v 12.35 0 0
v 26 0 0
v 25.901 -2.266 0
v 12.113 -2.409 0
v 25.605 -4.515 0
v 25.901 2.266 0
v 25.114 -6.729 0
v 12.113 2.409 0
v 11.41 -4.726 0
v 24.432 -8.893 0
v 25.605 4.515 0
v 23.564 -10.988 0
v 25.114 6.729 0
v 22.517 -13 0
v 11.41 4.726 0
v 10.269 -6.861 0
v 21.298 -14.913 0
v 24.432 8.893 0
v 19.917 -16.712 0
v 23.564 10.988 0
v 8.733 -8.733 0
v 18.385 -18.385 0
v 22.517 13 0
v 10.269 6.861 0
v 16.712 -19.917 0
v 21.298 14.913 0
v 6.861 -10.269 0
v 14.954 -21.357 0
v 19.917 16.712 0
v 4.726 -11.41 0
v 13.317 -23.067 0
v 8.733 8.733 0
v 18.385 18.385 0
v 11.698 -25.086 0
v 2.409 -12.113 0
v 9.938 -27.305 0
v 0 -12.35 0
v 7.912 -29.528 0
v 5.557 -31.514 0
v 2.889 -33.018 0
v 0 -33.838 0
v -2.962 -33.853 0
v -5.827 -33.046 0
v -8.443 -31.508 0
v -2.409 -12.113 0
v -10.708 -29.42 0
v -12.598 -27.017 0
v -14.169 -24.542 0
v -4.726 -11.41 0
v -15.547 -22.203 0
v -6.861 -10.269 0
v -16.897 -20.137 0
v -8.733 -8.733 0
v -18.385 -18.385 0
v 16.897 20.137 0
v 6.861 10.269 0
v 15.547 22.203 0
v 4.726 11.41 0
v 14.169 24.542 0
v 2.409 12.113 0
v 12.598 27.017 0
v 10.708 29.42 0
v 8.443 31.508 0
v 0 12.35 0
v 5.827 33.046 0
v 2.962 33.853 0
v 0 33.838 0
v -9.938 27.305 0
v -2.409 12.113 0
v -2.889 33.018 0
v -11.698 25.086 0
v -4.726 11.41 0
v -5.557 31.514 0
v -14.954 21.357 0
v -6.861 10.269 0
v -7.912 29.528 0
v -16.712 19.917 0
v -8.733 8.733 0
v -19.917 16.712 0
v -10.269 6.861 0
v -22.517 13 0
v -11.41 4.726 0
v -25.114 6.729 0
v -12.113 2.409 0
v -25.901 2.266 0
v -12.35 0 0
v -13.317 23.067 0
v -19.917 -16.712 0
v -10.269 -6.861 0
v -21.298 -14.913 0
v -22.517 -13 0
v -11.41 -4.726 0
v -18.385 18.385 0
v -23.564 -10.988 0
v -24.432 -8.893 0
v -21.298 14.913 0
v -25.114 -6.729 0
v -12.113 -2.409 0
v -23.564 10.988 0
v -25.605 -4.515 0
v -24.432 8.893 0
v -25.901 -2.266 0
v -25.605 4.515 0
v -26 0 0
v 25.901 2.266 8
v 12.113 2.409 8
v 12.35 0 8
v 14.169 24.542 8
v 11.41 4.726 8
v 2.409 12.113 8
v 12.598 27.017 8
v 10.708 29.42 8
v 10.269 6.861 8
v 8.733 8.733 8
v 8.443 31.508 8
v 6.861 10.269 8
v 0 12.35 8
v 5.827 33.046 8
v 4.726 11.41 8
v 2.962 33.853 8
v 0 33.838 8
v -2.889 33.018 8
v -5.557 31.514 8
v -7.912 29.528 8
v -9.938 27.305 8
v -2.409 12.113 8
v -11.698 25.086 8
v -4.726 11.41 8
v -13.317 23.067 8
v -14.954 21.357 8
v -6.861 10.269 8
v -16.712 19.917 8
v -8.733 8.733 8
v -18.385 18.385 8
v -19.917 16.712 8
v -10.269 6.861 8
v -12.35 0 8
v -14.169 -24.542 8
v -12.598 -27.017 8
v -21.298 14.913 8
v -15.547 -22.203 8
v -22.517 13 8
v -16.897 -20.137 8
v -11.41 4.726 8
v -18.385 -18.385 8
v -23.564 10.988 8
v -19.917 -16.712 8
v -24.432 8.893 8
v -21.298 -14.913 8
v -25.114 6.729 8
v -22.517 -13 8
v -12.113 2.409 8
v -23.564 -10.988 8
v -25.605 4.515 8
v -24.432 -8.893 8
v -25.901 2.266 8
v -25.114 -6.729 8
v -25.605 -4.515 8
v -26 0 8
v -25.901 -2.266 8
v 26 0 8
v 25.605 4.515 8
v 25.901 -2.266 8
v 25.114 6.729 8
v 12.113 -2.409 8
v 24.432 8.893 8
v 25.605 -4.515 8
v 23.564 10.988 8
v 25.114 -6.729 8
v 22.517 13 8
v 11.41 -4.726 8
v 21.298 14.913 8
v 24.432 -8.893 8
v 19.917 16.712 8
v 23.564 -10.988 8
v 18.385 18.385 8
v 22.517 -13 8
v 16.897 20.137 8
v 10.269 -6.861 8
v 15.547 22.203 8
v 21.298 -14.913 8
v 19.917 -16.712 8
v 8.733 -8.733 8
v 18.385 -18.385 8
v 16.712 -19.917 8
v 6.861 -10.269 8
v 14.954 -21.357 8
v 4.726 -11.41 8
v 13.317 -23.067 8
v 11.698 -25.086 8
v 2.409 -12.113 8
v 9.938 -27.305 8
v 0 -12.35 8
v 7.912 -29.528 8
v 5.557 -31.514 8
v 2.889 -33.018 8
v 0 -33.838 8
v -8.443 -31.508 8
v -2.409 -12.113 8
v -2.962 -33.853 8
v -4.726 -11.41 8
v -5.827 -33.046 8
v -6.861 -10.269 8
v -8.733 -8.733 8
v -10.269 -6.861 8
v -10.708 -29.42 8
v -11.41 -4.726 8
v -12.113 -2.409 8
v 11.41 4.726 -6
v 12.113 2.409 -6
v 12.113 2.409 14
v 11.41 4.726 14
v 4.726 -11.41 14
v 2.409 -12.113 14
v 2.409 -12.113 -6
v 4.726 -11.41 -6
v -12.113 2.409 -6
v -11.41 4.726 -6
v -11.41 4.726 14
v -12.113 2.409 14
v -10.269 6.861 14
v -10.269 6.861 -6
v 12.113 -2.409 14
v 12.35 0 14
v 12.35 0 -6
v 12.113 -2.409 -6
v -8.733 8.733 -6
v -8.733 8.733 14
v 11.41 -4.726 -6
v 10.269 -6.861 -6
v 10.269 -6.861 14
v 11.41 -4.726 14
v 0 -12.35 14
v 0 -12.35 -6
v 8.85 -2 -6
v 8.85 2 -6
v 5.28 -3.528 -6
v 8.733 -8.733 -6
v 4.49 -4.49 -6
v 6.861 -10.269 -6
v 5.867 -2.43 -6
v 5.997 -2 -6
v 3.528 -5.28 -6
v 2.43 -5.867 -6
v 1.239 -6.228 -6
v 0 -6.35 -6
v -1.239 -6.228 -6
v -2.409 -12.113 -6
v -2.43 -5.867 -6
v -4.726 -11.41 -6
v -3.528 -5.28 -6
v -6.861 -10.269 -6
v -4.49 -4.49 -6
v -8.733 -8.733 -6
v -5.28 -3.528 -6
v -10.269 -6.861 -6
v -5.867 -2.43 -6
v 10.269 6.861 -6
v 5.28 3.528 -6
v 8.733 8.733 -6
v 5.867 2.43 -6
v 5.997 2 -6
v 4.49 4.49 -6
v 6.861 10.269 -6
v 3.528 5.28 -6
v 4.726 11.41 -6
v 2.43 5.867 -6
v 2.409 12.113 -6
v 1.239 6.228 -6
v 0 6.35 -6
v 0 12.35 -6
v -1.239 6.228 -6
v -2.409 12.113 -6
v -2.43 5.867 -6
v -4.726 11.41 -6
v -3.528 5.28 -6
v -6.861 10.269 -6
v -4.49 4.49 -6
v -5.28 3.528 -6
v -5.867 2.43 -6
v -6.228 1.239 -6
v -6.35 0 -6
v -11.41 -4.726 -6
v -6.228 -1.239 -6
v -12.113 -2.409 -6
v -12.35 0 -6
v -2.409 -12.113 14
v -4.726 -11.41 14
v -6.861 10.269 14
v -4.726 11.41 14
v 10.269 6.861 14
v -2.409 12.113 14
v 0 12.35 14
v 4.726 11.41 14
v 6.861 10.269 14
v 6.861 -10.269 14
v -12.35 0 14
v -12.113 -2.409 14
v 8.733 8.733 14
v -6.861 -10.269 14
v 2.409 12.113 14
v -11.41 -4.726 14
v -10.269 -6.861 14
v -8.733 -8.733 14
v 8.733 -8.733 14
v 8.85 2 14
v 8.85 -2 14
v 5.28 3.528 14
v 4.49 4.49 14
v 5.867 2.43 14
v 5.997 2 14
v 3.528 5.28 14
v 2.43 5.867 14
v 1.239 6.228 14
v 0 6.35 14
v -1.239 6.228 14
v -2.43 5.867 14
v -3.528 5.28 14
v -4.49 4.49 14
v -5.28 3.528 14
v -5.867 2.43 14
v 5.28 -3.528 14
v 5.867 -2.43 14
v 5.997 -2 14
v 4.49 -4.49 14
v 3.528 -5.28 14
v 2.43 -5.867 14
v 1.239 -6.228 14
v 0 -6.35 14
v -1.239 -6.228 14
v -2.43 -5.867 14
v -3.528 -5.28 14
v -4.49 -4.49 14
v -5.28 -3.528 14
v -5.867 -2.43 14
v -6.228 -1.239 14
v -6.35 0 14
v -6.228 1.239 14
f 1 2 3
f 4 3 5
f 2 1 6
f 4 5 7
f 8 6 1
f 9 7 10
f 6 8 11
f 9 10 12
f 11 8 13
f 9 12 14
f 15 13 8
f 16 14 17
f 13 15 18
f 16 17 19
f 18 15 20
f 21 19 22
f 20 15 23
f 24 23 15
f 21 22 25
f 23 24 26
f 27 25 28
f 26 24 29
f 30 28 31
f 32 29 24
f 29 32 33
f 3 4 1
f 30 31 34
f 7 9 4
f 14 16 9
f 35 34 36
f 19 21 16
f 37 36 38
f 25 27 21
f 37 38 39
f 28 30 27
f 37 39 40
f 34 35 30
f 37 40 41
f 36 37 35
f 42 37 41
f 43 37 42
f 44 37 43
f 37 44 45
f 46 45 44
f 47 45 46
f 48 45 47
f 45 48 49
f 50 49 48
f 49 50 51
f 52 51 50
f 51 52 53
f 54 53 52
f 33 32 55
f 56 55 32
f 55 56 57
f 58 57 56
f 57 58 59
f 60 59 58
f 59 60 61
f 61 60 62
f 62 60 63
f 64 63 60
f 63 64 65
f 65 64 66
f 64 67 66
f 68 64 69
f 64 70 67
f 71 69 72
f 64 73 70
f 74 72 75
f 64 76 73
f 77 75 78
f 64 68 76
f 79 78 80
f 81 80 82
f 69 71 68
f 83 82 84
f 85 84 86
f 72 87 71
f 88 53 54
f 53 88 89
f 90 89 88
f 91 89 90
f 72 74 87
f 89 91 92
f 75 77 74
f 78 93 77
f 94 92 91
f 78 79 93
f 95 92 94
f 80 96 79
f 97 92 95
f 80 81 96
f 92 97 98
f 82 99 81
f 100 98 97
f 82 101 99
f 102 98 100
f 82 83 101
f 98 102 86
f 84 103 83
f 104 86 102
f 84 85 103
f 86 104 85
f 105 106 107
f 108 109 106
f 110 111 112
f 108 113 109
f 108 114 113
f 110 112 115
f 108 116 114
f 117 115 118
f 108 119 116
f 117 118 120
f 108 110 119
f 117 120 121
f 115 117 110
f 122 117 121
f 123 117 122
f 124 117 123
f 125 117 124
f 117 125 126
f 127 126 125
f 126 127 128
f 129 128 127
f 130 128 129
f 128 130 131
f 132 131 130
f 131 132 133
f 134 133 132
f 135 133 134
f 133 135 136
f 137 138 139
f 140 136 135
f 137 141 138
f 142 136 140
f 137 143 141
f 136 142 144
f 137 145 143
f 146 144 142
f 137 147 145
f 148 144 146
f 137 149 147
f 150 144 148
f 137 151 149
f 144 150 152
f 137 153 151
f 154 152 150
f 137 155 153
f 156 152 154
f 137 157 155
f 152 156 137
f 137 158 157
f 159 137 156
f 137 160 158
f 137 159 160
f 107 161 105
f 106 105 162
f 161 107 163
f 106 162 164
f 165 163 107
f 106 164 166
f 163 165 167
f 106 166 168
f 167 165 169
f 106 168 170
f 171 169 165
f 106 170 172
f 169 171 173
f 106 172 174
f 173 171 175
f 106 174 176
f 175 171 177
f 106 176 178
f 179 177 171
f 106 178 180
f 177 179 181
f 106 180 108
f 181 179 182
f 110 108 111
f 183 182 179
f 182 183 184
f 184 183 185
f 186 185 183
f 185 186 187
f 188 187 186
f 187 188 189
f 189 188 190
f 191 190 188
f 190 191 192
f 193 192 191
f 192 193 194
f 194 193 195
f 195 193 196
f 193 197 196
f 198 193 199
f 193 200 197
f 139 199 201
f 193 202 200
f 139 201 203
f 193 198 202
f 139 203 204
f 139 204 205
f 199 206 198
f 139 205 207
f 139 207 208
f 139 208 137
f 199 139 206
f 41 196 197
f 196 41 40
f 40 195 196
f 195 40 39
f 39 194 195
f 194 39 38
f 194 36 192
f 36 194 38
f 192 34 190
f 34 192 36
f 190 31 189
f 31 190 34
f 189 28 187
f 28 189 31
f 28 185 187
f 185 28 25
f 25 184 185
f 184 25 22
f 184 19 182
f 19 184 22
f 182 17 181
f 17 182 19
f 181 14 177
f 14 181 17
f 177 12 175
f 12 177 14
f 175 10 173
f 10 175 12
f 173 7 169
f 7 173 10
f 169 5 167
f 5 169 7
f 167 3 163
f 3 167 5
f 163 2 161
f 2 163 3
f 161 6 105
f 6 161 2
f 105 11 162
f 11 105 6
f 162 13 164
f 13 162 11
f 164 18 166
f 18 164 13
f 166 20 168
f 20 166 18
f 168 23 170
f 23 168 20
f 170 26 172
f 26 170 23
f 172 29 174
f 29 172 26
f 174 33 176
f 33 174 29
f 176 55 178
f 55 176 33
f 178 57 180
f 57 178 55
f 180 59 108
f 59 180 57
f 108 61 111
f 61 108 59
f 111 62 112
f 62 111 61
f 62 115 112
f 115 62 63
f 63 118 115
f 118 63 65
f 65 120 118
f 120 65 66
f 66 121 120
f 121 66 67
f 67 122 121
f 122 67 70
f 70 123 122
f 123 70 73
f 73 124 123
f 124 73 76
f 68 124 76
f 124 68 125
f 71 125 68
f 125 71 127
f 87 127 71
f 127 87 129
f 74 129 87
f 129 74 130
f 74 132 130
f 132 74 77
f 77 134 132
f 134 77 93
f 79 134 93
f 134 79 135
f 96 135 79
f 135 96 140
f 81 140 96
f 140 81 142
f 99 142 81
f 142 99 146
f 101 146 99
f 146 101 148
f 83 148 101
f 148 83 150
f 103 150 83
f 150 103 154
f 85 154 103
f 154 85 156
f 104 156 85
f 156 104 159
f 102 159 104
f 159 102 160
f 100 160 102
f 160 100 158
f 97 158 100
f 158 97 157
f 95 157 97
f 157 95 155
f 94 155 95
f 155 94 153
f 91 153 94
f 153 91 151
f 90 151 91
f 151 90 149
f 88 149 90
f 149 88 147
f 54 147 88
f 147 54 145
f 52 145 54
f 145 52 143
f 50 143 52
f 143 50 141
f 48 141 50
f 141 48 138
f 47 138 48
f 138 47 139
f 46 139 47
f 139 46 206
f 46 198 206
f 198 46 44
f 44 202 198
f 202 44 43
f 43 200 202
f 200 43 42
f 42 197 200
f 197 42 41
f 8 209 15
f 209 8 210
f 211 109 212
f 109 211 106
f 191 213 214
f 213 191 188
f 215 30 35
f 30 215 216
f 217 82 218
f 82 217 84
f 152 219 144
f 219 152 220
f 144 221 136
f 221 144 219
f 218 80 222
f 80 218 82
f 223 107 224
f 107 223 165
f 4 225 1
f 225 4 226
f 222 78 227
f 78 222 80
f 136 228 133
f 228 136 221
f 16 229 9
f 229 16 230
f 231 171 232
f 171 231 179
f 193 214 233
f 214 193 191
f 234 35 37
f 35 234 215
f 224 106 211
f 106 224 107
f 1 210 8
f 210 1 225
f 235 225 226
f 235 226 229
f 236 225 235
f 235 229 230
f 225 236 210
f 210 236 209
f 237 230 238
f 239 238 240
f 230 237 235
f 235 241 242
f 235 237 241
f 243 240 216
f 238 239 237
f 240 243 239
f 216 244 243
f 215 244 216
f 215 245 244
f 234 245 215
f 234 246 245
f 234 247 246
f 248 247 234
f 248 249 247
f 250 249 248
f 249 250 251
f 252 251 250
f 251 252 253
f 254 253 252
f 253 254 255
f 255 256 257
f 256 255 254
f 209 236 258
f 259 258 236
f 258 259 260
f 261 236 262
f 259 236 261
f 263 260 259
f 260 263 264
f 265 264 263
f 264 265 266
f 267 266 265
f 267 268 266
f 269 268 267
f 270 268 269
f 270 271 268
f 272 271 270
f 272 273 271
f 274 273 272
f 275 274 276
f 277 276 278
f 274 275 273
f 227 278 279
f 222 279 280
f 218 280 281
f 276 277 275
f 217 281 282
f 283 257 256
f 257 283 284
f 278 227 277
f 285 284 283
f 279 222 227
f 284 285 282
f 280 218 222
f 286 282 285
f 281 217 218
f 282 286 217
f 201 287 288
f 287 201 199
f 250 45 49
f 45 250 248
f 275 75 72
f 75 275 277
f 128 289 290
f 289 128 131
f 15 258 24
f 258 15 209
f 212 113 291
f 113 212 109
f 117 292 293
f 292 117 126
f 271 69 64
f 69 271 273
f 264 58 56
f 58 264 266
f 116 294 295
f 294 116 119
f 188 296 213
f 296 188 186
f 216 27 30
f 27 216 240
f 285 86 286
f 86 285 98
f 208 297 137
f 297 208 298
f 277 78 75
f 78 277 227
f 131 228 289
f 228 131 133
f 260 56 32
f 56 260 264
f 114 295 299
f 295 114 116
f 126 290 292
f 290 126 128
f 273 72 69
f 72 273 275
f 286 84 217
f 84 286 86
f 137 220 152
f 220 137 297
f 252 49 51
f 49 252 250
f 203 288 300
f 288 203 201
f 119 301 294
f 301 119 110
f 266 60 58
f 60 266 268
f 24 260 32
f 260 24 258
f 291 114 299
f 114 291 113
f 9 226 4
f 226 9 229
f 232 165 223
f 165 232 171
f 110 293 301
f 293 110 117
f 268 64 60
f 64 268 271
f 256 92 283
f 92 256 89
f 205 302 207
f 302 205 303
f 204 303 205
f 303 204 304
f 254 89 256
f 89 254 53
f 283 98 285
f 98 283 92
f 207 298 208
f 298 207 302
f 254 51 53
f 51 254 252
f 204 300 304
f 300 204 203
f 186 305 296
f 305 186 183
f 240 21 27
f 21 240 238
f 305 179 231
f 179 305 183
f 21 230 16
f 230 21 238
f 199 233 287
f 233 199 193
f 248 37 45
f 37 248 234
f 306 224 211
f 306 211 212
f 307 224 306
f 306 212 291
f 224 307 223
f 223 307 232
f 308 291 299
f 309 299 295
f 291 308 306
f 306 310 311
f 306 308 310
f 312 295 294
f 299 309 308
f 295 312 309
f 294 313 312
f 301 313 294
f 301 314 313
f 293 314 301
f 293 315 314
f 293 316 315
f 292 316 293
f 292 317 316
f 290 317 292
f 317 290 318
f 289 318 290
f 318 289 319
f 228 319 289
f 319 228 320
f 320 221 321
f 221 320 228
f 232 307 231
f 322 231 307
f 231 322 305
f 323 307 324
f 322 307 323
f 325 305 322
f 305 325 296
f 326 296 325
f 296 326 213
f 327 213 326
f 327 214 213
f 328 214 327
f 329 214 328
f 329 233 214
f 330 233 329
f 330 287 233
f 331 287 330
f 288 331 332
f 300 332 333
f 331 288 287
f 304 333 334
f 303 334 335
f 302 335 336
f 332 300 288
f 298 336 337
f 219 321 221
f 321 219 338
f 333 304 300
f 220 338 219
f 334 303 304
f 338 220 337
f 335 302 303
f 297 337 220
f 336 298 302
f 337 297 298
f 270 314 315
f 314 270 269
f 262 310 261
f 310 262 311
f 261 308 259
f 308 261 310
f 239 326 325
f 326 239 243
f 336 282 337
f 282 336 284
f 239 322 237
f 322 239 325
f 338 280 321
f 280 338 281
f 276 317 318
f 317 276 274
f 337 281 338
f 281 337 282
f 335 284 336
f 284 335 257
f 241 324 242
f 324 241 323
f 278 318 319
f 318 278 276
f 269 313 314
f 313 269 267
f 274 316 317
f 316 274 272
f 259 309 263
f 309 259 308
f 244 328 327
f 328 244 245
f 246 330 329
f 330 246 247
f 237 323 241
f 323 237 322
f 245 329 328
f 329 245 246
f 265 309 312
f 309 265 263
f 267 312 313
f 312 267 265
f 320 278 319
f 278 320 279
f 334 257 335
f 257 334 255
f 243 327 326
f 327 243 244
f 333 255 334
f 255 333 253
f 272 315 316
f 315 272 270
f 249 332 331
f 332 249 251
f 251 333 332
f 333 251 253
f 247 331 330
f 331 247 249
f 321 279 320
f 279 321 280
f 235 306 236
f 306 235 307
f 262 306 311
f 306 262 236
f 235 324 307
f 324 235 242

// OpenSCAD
$fn = 32;

// ----------------------------------------------------------------------
// Cam: base radius 26 mm with a 8 mm lift over 150 degrees
// ----------------------------------------------------------------------

// --- parameters (mm) ---
base_r = 26;              // base radius
lift = 8;                 // lift height above the base radius
lift_span = 150;          // angular width of the lift
lift_start = 45;          // angle where the lift starts
cam_t = 8;                // cam plate thickness
hub_d = 24.7;             // hub diameter
hub_h = 20;               // hub height
bore_d = 12.7;            // bore
key_w = 4;                // keyway width
key_depth = 2;            // keyway depth

cam_profile = [[26, 0], [25.901, 2.266], [25.605, 4.515], [25.114, 6.729], [24.432, 8.893], [23.564, 10.988], [22.517, 13], [21.298, 14.913], [19.917, 16.712], [18.385, 18.385], [16.897, 20.137], [15.547, 22.203], [14.169, 24.542], [12.598, 27.017], [10.708, 29.42], [8.443, 31.508], [5.827, 33.046], [2.962, 33.853], [0, 33.838], [-2.889, 33.018], [-5.557, 31.514], [-7.912, 29.528], [-9.938, 27.305], [-11.698, 25.086], [-13.317, 23.067], [-14.954, 21.357], [-16.712, 19.917], [-18.385, 18.385], [-19.917, 16.712], [-21.298, 14.913], [-22.517, 13], [-23.564, 10.988], [-24.432, 8.893], [-25.114, 6.729], [-25.605, 4.515], [-25.901, 2.266], [-26, 0], [-25.901, -2.266], [-25.605, -4.515], [-25.114, -6.729], [-24.432, -8.893], [-23.564, -10.988], [-22.517, -13], [-21.298, -14.913], [-19.917, -16.712], [-18.385, -18.385], [-16.897, -20.137], [-15.547, -22.203], [-14.169, -24.542], [-12.598, -27.017], [-10.708, -29.42], [-8.443, -31.508], [-5.827, -33.046], [-2.962, -33.853], [0, -33.838], [2.889, -33.018], [5.557, -31.514], [7.912, -29.528], [9.938, -27.305], [11.698, -25.086], [13.317, -23.067], [14.954, -21.357], [16.712, -19.917], [18.385, -18.385], [19.917, -16.712], [21.298, -14.913], [22.517, -13], [23.564, -10.988], [24.432, -8.893], [25.114, -6.729], [25.605, -4.515], [25.901, -2.266]];

difference() {
  union() {
    linear_extrude(height = cam_t) polygon(cam_profile);
    /* hub, proud of the cam plate on both sides */
    translate([0, 0, -6]) cylinder(h = hub_h, d = hub_d);
  }
  /* bore through the hub, 2.5 mm clear on both faces */
  translate([0, 0, -8.5]) cylinder(h = hub_h + 5, d = bore_d);
  /* keyway, milled through the whole hub */
  translate([4.35, -2, -8.5]) cube([4.5, 4, 25]);
}
